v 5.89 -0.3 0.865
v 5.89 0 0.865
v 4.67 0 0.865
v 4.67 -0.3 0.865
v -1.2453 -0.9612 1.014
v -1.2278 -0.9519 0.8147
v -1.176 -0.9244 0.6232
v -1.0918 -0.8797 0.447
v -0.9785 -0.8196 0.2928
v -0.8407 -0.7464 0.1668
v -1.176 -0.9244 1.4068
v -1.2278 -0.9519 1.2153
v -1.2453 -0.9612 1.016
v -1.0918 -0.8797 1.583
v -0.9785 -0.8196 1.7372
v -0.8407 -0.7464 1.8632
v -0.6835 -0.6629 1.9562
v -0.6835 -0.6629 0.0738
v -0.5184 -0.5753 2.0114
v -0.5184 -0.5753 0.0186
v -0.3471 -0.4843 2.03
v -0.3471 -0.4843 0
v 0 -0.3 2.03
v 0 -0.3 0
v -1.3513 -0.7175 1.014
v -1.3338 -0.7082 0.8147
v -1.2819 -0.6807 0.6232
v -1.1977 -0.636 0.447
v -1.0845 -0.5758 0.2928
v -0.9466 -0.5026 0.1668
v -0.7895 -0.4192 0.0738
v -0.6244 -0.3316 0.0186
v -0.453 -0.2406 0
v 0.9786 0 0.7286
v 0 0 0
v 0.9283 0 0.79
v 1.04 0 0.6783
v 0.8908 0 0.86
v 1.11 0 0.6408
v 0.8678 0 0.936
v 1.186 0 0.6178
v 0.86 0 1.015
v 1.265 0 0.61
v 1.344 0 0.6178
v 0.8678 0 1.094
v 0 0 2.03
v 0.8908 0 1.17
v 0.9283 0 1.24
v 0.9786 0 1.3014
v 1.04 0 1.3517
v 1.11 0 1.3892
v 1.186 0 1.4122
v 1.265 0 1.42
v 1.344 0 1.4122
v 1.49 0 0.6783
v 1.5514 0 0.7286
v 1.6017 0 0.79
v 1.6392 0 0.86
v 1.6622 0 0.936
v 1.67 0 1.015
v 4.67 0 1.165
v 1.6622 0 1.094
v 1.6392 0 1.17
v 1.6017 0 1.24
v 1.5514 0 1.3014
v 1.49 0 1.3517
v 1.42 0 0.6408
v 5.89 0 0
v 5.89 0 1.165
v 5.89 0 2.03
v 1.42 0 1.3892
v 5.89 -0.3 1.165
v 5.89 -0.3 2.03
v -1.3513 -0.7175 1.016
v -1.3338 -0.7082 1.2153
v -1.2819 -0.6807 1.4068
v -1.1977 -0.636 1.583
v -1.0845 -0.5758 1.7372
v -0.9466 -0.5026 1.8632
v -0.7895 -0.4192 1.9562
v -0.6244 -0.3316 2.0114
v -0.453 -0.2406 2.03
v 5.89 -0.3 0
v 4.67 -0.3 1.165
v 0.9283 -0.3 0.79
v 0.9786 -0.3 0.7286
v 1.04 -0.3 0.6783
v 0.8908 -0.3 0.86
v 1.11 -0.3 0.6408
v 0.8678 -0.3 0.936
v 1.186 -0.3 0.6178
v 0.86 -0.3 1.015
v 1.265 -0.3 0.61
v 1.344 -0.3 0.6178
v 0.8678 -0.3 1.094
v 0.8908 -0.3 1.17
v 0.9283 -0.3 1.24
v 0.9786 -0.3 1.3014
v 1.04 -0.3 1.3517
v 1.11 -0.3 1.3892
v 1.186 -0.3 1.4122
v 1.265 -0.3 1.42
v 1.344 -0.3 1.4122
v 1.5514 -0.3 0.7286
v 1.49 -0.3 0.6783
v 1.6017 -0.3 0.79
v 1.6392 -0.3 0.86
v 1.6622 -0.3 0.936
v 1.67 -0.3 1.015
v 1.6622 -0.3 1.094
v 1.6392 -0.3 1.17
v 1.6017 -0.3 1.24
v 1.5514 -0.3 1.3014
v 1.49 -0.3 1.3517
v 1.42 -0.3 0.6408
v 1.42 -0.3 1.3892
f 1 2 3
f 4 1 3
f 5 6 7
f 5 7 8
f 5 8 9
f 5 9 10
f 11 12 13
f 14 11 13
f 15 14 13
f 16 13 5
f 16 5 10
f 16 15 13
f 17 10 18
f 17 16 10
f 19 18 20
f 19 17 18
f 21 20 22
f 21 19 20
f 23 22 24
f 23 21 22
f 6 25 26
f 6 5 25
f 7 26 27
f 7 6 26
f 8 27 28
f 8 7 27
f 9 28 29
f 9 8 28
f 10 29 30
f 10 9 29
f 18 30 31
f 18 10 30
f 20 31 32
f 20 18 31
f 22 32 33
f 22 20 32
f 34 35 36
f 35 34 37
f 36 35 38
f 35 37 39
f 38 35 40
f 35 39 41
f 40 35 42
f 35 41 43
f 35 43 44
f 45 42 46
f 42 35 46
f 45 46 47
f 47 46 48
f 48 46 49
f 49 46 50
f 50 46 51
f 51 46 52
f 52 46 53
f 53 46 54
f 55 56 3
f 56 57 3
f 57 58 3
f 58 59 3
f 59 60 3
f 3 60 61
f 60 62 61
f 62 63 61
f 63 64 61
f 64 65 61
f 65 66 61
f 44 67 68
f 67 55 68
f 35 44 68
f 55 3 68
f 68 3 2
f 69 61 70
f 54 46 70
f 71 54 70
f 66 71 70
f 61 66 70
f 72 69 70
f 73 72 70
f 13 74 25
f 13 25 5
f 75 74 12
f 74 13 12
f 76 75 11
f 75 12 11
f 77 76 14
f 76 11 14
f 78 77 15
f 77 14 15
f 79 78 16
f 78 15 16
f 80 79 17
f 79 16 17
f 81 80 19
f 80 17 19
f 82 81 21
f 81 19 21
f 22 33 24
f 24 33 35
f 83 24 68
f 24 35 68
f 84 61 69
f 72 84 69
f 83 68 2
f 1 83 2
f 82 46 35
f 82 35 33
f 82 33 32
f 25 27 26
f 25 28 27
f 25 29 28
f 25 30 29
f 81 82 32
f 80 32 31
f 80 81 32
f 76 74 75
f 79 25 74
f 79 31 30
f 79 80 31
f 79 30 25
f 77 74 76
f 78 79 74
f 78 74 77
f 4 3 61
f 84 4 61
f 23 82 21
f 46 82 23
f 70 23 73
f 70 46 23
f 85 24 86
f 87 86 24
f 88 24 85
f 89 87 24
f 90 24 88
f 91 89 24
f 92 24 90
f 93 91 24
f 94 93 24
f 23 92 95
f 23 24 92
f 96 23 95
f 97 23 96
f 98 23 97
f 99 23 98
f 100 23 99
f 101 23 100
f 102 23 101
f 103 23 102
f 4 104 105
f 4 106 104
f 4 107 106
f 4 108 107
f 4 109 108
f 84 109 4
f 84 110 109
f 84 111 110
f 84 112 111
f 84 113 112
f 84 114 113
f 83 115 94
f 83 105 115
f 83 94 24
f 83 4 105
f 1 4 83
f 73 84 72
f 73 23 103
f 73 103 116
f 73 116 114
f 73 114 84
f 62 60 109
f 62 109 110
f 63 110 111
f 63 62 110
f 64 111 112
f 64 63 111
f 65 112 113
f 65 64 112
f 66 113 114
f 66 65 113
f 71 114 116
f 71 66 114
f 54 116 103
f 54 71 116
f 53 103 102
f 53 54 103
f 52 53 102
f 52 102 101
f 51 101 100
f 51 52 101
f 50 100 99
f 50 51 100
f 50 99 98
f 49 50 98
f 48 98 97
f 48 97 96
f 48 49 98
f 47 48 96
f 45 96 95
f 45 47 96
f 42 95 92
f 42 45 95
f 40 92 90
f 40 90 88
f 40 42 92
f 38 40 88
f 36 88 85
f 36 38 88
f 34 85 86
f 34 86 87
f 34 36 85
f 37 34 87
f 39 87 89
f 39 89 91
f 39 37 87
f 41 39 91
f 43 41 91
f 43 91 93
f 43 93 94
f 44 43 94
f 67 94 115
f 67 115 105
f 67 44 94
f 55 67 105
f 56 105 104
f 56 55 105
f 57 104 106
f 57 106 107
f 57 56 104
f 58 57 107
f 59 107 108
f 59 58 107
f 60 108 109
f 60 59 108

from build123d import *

# Parameters (mm, degrees)
F0_R     = 0.405
F1_DEPTH = 0.3
F3_DEPTH = 2.03
F4_R     = 1.01397


with BuildPart() as f1:
    # F0 (on Front) → F1 (new body)
    with BuildSketch(Plane.XZ):
        Polygon((0, 2.03), (0, 0), (5.89, 0), (5.89, 0.865), (4.67, 0.865), (4.67, 1.165), (5.89, 1.165), (5.89, 2.03), align=None)
        with Locations((1.265, 1.015)):
            Circle(F0_R, mode=Mode.SUBTRACT)
    extrude(amount=F1_DEPTH)

    # F2 (on face) → F3 (join)
    with BuildSketch(Plane.XY.offset(2.03)):
        Polygon((0, -0.3), (0, 0), (-1.351321, -0.717518), (-1.245335, -0.961242), align=None)
    extrude(amount=-F3_DEPTH)

    # F4
    f4_edges = [f1.edges().sort_by_distance(p)[0] for p in [
        (-1.298328, -0.83938, 0),
        (-1.298328, -0.83938, 2.03),
    ]]
    fillet(f4_edges, radius=F4_R)


solid = f1.part
